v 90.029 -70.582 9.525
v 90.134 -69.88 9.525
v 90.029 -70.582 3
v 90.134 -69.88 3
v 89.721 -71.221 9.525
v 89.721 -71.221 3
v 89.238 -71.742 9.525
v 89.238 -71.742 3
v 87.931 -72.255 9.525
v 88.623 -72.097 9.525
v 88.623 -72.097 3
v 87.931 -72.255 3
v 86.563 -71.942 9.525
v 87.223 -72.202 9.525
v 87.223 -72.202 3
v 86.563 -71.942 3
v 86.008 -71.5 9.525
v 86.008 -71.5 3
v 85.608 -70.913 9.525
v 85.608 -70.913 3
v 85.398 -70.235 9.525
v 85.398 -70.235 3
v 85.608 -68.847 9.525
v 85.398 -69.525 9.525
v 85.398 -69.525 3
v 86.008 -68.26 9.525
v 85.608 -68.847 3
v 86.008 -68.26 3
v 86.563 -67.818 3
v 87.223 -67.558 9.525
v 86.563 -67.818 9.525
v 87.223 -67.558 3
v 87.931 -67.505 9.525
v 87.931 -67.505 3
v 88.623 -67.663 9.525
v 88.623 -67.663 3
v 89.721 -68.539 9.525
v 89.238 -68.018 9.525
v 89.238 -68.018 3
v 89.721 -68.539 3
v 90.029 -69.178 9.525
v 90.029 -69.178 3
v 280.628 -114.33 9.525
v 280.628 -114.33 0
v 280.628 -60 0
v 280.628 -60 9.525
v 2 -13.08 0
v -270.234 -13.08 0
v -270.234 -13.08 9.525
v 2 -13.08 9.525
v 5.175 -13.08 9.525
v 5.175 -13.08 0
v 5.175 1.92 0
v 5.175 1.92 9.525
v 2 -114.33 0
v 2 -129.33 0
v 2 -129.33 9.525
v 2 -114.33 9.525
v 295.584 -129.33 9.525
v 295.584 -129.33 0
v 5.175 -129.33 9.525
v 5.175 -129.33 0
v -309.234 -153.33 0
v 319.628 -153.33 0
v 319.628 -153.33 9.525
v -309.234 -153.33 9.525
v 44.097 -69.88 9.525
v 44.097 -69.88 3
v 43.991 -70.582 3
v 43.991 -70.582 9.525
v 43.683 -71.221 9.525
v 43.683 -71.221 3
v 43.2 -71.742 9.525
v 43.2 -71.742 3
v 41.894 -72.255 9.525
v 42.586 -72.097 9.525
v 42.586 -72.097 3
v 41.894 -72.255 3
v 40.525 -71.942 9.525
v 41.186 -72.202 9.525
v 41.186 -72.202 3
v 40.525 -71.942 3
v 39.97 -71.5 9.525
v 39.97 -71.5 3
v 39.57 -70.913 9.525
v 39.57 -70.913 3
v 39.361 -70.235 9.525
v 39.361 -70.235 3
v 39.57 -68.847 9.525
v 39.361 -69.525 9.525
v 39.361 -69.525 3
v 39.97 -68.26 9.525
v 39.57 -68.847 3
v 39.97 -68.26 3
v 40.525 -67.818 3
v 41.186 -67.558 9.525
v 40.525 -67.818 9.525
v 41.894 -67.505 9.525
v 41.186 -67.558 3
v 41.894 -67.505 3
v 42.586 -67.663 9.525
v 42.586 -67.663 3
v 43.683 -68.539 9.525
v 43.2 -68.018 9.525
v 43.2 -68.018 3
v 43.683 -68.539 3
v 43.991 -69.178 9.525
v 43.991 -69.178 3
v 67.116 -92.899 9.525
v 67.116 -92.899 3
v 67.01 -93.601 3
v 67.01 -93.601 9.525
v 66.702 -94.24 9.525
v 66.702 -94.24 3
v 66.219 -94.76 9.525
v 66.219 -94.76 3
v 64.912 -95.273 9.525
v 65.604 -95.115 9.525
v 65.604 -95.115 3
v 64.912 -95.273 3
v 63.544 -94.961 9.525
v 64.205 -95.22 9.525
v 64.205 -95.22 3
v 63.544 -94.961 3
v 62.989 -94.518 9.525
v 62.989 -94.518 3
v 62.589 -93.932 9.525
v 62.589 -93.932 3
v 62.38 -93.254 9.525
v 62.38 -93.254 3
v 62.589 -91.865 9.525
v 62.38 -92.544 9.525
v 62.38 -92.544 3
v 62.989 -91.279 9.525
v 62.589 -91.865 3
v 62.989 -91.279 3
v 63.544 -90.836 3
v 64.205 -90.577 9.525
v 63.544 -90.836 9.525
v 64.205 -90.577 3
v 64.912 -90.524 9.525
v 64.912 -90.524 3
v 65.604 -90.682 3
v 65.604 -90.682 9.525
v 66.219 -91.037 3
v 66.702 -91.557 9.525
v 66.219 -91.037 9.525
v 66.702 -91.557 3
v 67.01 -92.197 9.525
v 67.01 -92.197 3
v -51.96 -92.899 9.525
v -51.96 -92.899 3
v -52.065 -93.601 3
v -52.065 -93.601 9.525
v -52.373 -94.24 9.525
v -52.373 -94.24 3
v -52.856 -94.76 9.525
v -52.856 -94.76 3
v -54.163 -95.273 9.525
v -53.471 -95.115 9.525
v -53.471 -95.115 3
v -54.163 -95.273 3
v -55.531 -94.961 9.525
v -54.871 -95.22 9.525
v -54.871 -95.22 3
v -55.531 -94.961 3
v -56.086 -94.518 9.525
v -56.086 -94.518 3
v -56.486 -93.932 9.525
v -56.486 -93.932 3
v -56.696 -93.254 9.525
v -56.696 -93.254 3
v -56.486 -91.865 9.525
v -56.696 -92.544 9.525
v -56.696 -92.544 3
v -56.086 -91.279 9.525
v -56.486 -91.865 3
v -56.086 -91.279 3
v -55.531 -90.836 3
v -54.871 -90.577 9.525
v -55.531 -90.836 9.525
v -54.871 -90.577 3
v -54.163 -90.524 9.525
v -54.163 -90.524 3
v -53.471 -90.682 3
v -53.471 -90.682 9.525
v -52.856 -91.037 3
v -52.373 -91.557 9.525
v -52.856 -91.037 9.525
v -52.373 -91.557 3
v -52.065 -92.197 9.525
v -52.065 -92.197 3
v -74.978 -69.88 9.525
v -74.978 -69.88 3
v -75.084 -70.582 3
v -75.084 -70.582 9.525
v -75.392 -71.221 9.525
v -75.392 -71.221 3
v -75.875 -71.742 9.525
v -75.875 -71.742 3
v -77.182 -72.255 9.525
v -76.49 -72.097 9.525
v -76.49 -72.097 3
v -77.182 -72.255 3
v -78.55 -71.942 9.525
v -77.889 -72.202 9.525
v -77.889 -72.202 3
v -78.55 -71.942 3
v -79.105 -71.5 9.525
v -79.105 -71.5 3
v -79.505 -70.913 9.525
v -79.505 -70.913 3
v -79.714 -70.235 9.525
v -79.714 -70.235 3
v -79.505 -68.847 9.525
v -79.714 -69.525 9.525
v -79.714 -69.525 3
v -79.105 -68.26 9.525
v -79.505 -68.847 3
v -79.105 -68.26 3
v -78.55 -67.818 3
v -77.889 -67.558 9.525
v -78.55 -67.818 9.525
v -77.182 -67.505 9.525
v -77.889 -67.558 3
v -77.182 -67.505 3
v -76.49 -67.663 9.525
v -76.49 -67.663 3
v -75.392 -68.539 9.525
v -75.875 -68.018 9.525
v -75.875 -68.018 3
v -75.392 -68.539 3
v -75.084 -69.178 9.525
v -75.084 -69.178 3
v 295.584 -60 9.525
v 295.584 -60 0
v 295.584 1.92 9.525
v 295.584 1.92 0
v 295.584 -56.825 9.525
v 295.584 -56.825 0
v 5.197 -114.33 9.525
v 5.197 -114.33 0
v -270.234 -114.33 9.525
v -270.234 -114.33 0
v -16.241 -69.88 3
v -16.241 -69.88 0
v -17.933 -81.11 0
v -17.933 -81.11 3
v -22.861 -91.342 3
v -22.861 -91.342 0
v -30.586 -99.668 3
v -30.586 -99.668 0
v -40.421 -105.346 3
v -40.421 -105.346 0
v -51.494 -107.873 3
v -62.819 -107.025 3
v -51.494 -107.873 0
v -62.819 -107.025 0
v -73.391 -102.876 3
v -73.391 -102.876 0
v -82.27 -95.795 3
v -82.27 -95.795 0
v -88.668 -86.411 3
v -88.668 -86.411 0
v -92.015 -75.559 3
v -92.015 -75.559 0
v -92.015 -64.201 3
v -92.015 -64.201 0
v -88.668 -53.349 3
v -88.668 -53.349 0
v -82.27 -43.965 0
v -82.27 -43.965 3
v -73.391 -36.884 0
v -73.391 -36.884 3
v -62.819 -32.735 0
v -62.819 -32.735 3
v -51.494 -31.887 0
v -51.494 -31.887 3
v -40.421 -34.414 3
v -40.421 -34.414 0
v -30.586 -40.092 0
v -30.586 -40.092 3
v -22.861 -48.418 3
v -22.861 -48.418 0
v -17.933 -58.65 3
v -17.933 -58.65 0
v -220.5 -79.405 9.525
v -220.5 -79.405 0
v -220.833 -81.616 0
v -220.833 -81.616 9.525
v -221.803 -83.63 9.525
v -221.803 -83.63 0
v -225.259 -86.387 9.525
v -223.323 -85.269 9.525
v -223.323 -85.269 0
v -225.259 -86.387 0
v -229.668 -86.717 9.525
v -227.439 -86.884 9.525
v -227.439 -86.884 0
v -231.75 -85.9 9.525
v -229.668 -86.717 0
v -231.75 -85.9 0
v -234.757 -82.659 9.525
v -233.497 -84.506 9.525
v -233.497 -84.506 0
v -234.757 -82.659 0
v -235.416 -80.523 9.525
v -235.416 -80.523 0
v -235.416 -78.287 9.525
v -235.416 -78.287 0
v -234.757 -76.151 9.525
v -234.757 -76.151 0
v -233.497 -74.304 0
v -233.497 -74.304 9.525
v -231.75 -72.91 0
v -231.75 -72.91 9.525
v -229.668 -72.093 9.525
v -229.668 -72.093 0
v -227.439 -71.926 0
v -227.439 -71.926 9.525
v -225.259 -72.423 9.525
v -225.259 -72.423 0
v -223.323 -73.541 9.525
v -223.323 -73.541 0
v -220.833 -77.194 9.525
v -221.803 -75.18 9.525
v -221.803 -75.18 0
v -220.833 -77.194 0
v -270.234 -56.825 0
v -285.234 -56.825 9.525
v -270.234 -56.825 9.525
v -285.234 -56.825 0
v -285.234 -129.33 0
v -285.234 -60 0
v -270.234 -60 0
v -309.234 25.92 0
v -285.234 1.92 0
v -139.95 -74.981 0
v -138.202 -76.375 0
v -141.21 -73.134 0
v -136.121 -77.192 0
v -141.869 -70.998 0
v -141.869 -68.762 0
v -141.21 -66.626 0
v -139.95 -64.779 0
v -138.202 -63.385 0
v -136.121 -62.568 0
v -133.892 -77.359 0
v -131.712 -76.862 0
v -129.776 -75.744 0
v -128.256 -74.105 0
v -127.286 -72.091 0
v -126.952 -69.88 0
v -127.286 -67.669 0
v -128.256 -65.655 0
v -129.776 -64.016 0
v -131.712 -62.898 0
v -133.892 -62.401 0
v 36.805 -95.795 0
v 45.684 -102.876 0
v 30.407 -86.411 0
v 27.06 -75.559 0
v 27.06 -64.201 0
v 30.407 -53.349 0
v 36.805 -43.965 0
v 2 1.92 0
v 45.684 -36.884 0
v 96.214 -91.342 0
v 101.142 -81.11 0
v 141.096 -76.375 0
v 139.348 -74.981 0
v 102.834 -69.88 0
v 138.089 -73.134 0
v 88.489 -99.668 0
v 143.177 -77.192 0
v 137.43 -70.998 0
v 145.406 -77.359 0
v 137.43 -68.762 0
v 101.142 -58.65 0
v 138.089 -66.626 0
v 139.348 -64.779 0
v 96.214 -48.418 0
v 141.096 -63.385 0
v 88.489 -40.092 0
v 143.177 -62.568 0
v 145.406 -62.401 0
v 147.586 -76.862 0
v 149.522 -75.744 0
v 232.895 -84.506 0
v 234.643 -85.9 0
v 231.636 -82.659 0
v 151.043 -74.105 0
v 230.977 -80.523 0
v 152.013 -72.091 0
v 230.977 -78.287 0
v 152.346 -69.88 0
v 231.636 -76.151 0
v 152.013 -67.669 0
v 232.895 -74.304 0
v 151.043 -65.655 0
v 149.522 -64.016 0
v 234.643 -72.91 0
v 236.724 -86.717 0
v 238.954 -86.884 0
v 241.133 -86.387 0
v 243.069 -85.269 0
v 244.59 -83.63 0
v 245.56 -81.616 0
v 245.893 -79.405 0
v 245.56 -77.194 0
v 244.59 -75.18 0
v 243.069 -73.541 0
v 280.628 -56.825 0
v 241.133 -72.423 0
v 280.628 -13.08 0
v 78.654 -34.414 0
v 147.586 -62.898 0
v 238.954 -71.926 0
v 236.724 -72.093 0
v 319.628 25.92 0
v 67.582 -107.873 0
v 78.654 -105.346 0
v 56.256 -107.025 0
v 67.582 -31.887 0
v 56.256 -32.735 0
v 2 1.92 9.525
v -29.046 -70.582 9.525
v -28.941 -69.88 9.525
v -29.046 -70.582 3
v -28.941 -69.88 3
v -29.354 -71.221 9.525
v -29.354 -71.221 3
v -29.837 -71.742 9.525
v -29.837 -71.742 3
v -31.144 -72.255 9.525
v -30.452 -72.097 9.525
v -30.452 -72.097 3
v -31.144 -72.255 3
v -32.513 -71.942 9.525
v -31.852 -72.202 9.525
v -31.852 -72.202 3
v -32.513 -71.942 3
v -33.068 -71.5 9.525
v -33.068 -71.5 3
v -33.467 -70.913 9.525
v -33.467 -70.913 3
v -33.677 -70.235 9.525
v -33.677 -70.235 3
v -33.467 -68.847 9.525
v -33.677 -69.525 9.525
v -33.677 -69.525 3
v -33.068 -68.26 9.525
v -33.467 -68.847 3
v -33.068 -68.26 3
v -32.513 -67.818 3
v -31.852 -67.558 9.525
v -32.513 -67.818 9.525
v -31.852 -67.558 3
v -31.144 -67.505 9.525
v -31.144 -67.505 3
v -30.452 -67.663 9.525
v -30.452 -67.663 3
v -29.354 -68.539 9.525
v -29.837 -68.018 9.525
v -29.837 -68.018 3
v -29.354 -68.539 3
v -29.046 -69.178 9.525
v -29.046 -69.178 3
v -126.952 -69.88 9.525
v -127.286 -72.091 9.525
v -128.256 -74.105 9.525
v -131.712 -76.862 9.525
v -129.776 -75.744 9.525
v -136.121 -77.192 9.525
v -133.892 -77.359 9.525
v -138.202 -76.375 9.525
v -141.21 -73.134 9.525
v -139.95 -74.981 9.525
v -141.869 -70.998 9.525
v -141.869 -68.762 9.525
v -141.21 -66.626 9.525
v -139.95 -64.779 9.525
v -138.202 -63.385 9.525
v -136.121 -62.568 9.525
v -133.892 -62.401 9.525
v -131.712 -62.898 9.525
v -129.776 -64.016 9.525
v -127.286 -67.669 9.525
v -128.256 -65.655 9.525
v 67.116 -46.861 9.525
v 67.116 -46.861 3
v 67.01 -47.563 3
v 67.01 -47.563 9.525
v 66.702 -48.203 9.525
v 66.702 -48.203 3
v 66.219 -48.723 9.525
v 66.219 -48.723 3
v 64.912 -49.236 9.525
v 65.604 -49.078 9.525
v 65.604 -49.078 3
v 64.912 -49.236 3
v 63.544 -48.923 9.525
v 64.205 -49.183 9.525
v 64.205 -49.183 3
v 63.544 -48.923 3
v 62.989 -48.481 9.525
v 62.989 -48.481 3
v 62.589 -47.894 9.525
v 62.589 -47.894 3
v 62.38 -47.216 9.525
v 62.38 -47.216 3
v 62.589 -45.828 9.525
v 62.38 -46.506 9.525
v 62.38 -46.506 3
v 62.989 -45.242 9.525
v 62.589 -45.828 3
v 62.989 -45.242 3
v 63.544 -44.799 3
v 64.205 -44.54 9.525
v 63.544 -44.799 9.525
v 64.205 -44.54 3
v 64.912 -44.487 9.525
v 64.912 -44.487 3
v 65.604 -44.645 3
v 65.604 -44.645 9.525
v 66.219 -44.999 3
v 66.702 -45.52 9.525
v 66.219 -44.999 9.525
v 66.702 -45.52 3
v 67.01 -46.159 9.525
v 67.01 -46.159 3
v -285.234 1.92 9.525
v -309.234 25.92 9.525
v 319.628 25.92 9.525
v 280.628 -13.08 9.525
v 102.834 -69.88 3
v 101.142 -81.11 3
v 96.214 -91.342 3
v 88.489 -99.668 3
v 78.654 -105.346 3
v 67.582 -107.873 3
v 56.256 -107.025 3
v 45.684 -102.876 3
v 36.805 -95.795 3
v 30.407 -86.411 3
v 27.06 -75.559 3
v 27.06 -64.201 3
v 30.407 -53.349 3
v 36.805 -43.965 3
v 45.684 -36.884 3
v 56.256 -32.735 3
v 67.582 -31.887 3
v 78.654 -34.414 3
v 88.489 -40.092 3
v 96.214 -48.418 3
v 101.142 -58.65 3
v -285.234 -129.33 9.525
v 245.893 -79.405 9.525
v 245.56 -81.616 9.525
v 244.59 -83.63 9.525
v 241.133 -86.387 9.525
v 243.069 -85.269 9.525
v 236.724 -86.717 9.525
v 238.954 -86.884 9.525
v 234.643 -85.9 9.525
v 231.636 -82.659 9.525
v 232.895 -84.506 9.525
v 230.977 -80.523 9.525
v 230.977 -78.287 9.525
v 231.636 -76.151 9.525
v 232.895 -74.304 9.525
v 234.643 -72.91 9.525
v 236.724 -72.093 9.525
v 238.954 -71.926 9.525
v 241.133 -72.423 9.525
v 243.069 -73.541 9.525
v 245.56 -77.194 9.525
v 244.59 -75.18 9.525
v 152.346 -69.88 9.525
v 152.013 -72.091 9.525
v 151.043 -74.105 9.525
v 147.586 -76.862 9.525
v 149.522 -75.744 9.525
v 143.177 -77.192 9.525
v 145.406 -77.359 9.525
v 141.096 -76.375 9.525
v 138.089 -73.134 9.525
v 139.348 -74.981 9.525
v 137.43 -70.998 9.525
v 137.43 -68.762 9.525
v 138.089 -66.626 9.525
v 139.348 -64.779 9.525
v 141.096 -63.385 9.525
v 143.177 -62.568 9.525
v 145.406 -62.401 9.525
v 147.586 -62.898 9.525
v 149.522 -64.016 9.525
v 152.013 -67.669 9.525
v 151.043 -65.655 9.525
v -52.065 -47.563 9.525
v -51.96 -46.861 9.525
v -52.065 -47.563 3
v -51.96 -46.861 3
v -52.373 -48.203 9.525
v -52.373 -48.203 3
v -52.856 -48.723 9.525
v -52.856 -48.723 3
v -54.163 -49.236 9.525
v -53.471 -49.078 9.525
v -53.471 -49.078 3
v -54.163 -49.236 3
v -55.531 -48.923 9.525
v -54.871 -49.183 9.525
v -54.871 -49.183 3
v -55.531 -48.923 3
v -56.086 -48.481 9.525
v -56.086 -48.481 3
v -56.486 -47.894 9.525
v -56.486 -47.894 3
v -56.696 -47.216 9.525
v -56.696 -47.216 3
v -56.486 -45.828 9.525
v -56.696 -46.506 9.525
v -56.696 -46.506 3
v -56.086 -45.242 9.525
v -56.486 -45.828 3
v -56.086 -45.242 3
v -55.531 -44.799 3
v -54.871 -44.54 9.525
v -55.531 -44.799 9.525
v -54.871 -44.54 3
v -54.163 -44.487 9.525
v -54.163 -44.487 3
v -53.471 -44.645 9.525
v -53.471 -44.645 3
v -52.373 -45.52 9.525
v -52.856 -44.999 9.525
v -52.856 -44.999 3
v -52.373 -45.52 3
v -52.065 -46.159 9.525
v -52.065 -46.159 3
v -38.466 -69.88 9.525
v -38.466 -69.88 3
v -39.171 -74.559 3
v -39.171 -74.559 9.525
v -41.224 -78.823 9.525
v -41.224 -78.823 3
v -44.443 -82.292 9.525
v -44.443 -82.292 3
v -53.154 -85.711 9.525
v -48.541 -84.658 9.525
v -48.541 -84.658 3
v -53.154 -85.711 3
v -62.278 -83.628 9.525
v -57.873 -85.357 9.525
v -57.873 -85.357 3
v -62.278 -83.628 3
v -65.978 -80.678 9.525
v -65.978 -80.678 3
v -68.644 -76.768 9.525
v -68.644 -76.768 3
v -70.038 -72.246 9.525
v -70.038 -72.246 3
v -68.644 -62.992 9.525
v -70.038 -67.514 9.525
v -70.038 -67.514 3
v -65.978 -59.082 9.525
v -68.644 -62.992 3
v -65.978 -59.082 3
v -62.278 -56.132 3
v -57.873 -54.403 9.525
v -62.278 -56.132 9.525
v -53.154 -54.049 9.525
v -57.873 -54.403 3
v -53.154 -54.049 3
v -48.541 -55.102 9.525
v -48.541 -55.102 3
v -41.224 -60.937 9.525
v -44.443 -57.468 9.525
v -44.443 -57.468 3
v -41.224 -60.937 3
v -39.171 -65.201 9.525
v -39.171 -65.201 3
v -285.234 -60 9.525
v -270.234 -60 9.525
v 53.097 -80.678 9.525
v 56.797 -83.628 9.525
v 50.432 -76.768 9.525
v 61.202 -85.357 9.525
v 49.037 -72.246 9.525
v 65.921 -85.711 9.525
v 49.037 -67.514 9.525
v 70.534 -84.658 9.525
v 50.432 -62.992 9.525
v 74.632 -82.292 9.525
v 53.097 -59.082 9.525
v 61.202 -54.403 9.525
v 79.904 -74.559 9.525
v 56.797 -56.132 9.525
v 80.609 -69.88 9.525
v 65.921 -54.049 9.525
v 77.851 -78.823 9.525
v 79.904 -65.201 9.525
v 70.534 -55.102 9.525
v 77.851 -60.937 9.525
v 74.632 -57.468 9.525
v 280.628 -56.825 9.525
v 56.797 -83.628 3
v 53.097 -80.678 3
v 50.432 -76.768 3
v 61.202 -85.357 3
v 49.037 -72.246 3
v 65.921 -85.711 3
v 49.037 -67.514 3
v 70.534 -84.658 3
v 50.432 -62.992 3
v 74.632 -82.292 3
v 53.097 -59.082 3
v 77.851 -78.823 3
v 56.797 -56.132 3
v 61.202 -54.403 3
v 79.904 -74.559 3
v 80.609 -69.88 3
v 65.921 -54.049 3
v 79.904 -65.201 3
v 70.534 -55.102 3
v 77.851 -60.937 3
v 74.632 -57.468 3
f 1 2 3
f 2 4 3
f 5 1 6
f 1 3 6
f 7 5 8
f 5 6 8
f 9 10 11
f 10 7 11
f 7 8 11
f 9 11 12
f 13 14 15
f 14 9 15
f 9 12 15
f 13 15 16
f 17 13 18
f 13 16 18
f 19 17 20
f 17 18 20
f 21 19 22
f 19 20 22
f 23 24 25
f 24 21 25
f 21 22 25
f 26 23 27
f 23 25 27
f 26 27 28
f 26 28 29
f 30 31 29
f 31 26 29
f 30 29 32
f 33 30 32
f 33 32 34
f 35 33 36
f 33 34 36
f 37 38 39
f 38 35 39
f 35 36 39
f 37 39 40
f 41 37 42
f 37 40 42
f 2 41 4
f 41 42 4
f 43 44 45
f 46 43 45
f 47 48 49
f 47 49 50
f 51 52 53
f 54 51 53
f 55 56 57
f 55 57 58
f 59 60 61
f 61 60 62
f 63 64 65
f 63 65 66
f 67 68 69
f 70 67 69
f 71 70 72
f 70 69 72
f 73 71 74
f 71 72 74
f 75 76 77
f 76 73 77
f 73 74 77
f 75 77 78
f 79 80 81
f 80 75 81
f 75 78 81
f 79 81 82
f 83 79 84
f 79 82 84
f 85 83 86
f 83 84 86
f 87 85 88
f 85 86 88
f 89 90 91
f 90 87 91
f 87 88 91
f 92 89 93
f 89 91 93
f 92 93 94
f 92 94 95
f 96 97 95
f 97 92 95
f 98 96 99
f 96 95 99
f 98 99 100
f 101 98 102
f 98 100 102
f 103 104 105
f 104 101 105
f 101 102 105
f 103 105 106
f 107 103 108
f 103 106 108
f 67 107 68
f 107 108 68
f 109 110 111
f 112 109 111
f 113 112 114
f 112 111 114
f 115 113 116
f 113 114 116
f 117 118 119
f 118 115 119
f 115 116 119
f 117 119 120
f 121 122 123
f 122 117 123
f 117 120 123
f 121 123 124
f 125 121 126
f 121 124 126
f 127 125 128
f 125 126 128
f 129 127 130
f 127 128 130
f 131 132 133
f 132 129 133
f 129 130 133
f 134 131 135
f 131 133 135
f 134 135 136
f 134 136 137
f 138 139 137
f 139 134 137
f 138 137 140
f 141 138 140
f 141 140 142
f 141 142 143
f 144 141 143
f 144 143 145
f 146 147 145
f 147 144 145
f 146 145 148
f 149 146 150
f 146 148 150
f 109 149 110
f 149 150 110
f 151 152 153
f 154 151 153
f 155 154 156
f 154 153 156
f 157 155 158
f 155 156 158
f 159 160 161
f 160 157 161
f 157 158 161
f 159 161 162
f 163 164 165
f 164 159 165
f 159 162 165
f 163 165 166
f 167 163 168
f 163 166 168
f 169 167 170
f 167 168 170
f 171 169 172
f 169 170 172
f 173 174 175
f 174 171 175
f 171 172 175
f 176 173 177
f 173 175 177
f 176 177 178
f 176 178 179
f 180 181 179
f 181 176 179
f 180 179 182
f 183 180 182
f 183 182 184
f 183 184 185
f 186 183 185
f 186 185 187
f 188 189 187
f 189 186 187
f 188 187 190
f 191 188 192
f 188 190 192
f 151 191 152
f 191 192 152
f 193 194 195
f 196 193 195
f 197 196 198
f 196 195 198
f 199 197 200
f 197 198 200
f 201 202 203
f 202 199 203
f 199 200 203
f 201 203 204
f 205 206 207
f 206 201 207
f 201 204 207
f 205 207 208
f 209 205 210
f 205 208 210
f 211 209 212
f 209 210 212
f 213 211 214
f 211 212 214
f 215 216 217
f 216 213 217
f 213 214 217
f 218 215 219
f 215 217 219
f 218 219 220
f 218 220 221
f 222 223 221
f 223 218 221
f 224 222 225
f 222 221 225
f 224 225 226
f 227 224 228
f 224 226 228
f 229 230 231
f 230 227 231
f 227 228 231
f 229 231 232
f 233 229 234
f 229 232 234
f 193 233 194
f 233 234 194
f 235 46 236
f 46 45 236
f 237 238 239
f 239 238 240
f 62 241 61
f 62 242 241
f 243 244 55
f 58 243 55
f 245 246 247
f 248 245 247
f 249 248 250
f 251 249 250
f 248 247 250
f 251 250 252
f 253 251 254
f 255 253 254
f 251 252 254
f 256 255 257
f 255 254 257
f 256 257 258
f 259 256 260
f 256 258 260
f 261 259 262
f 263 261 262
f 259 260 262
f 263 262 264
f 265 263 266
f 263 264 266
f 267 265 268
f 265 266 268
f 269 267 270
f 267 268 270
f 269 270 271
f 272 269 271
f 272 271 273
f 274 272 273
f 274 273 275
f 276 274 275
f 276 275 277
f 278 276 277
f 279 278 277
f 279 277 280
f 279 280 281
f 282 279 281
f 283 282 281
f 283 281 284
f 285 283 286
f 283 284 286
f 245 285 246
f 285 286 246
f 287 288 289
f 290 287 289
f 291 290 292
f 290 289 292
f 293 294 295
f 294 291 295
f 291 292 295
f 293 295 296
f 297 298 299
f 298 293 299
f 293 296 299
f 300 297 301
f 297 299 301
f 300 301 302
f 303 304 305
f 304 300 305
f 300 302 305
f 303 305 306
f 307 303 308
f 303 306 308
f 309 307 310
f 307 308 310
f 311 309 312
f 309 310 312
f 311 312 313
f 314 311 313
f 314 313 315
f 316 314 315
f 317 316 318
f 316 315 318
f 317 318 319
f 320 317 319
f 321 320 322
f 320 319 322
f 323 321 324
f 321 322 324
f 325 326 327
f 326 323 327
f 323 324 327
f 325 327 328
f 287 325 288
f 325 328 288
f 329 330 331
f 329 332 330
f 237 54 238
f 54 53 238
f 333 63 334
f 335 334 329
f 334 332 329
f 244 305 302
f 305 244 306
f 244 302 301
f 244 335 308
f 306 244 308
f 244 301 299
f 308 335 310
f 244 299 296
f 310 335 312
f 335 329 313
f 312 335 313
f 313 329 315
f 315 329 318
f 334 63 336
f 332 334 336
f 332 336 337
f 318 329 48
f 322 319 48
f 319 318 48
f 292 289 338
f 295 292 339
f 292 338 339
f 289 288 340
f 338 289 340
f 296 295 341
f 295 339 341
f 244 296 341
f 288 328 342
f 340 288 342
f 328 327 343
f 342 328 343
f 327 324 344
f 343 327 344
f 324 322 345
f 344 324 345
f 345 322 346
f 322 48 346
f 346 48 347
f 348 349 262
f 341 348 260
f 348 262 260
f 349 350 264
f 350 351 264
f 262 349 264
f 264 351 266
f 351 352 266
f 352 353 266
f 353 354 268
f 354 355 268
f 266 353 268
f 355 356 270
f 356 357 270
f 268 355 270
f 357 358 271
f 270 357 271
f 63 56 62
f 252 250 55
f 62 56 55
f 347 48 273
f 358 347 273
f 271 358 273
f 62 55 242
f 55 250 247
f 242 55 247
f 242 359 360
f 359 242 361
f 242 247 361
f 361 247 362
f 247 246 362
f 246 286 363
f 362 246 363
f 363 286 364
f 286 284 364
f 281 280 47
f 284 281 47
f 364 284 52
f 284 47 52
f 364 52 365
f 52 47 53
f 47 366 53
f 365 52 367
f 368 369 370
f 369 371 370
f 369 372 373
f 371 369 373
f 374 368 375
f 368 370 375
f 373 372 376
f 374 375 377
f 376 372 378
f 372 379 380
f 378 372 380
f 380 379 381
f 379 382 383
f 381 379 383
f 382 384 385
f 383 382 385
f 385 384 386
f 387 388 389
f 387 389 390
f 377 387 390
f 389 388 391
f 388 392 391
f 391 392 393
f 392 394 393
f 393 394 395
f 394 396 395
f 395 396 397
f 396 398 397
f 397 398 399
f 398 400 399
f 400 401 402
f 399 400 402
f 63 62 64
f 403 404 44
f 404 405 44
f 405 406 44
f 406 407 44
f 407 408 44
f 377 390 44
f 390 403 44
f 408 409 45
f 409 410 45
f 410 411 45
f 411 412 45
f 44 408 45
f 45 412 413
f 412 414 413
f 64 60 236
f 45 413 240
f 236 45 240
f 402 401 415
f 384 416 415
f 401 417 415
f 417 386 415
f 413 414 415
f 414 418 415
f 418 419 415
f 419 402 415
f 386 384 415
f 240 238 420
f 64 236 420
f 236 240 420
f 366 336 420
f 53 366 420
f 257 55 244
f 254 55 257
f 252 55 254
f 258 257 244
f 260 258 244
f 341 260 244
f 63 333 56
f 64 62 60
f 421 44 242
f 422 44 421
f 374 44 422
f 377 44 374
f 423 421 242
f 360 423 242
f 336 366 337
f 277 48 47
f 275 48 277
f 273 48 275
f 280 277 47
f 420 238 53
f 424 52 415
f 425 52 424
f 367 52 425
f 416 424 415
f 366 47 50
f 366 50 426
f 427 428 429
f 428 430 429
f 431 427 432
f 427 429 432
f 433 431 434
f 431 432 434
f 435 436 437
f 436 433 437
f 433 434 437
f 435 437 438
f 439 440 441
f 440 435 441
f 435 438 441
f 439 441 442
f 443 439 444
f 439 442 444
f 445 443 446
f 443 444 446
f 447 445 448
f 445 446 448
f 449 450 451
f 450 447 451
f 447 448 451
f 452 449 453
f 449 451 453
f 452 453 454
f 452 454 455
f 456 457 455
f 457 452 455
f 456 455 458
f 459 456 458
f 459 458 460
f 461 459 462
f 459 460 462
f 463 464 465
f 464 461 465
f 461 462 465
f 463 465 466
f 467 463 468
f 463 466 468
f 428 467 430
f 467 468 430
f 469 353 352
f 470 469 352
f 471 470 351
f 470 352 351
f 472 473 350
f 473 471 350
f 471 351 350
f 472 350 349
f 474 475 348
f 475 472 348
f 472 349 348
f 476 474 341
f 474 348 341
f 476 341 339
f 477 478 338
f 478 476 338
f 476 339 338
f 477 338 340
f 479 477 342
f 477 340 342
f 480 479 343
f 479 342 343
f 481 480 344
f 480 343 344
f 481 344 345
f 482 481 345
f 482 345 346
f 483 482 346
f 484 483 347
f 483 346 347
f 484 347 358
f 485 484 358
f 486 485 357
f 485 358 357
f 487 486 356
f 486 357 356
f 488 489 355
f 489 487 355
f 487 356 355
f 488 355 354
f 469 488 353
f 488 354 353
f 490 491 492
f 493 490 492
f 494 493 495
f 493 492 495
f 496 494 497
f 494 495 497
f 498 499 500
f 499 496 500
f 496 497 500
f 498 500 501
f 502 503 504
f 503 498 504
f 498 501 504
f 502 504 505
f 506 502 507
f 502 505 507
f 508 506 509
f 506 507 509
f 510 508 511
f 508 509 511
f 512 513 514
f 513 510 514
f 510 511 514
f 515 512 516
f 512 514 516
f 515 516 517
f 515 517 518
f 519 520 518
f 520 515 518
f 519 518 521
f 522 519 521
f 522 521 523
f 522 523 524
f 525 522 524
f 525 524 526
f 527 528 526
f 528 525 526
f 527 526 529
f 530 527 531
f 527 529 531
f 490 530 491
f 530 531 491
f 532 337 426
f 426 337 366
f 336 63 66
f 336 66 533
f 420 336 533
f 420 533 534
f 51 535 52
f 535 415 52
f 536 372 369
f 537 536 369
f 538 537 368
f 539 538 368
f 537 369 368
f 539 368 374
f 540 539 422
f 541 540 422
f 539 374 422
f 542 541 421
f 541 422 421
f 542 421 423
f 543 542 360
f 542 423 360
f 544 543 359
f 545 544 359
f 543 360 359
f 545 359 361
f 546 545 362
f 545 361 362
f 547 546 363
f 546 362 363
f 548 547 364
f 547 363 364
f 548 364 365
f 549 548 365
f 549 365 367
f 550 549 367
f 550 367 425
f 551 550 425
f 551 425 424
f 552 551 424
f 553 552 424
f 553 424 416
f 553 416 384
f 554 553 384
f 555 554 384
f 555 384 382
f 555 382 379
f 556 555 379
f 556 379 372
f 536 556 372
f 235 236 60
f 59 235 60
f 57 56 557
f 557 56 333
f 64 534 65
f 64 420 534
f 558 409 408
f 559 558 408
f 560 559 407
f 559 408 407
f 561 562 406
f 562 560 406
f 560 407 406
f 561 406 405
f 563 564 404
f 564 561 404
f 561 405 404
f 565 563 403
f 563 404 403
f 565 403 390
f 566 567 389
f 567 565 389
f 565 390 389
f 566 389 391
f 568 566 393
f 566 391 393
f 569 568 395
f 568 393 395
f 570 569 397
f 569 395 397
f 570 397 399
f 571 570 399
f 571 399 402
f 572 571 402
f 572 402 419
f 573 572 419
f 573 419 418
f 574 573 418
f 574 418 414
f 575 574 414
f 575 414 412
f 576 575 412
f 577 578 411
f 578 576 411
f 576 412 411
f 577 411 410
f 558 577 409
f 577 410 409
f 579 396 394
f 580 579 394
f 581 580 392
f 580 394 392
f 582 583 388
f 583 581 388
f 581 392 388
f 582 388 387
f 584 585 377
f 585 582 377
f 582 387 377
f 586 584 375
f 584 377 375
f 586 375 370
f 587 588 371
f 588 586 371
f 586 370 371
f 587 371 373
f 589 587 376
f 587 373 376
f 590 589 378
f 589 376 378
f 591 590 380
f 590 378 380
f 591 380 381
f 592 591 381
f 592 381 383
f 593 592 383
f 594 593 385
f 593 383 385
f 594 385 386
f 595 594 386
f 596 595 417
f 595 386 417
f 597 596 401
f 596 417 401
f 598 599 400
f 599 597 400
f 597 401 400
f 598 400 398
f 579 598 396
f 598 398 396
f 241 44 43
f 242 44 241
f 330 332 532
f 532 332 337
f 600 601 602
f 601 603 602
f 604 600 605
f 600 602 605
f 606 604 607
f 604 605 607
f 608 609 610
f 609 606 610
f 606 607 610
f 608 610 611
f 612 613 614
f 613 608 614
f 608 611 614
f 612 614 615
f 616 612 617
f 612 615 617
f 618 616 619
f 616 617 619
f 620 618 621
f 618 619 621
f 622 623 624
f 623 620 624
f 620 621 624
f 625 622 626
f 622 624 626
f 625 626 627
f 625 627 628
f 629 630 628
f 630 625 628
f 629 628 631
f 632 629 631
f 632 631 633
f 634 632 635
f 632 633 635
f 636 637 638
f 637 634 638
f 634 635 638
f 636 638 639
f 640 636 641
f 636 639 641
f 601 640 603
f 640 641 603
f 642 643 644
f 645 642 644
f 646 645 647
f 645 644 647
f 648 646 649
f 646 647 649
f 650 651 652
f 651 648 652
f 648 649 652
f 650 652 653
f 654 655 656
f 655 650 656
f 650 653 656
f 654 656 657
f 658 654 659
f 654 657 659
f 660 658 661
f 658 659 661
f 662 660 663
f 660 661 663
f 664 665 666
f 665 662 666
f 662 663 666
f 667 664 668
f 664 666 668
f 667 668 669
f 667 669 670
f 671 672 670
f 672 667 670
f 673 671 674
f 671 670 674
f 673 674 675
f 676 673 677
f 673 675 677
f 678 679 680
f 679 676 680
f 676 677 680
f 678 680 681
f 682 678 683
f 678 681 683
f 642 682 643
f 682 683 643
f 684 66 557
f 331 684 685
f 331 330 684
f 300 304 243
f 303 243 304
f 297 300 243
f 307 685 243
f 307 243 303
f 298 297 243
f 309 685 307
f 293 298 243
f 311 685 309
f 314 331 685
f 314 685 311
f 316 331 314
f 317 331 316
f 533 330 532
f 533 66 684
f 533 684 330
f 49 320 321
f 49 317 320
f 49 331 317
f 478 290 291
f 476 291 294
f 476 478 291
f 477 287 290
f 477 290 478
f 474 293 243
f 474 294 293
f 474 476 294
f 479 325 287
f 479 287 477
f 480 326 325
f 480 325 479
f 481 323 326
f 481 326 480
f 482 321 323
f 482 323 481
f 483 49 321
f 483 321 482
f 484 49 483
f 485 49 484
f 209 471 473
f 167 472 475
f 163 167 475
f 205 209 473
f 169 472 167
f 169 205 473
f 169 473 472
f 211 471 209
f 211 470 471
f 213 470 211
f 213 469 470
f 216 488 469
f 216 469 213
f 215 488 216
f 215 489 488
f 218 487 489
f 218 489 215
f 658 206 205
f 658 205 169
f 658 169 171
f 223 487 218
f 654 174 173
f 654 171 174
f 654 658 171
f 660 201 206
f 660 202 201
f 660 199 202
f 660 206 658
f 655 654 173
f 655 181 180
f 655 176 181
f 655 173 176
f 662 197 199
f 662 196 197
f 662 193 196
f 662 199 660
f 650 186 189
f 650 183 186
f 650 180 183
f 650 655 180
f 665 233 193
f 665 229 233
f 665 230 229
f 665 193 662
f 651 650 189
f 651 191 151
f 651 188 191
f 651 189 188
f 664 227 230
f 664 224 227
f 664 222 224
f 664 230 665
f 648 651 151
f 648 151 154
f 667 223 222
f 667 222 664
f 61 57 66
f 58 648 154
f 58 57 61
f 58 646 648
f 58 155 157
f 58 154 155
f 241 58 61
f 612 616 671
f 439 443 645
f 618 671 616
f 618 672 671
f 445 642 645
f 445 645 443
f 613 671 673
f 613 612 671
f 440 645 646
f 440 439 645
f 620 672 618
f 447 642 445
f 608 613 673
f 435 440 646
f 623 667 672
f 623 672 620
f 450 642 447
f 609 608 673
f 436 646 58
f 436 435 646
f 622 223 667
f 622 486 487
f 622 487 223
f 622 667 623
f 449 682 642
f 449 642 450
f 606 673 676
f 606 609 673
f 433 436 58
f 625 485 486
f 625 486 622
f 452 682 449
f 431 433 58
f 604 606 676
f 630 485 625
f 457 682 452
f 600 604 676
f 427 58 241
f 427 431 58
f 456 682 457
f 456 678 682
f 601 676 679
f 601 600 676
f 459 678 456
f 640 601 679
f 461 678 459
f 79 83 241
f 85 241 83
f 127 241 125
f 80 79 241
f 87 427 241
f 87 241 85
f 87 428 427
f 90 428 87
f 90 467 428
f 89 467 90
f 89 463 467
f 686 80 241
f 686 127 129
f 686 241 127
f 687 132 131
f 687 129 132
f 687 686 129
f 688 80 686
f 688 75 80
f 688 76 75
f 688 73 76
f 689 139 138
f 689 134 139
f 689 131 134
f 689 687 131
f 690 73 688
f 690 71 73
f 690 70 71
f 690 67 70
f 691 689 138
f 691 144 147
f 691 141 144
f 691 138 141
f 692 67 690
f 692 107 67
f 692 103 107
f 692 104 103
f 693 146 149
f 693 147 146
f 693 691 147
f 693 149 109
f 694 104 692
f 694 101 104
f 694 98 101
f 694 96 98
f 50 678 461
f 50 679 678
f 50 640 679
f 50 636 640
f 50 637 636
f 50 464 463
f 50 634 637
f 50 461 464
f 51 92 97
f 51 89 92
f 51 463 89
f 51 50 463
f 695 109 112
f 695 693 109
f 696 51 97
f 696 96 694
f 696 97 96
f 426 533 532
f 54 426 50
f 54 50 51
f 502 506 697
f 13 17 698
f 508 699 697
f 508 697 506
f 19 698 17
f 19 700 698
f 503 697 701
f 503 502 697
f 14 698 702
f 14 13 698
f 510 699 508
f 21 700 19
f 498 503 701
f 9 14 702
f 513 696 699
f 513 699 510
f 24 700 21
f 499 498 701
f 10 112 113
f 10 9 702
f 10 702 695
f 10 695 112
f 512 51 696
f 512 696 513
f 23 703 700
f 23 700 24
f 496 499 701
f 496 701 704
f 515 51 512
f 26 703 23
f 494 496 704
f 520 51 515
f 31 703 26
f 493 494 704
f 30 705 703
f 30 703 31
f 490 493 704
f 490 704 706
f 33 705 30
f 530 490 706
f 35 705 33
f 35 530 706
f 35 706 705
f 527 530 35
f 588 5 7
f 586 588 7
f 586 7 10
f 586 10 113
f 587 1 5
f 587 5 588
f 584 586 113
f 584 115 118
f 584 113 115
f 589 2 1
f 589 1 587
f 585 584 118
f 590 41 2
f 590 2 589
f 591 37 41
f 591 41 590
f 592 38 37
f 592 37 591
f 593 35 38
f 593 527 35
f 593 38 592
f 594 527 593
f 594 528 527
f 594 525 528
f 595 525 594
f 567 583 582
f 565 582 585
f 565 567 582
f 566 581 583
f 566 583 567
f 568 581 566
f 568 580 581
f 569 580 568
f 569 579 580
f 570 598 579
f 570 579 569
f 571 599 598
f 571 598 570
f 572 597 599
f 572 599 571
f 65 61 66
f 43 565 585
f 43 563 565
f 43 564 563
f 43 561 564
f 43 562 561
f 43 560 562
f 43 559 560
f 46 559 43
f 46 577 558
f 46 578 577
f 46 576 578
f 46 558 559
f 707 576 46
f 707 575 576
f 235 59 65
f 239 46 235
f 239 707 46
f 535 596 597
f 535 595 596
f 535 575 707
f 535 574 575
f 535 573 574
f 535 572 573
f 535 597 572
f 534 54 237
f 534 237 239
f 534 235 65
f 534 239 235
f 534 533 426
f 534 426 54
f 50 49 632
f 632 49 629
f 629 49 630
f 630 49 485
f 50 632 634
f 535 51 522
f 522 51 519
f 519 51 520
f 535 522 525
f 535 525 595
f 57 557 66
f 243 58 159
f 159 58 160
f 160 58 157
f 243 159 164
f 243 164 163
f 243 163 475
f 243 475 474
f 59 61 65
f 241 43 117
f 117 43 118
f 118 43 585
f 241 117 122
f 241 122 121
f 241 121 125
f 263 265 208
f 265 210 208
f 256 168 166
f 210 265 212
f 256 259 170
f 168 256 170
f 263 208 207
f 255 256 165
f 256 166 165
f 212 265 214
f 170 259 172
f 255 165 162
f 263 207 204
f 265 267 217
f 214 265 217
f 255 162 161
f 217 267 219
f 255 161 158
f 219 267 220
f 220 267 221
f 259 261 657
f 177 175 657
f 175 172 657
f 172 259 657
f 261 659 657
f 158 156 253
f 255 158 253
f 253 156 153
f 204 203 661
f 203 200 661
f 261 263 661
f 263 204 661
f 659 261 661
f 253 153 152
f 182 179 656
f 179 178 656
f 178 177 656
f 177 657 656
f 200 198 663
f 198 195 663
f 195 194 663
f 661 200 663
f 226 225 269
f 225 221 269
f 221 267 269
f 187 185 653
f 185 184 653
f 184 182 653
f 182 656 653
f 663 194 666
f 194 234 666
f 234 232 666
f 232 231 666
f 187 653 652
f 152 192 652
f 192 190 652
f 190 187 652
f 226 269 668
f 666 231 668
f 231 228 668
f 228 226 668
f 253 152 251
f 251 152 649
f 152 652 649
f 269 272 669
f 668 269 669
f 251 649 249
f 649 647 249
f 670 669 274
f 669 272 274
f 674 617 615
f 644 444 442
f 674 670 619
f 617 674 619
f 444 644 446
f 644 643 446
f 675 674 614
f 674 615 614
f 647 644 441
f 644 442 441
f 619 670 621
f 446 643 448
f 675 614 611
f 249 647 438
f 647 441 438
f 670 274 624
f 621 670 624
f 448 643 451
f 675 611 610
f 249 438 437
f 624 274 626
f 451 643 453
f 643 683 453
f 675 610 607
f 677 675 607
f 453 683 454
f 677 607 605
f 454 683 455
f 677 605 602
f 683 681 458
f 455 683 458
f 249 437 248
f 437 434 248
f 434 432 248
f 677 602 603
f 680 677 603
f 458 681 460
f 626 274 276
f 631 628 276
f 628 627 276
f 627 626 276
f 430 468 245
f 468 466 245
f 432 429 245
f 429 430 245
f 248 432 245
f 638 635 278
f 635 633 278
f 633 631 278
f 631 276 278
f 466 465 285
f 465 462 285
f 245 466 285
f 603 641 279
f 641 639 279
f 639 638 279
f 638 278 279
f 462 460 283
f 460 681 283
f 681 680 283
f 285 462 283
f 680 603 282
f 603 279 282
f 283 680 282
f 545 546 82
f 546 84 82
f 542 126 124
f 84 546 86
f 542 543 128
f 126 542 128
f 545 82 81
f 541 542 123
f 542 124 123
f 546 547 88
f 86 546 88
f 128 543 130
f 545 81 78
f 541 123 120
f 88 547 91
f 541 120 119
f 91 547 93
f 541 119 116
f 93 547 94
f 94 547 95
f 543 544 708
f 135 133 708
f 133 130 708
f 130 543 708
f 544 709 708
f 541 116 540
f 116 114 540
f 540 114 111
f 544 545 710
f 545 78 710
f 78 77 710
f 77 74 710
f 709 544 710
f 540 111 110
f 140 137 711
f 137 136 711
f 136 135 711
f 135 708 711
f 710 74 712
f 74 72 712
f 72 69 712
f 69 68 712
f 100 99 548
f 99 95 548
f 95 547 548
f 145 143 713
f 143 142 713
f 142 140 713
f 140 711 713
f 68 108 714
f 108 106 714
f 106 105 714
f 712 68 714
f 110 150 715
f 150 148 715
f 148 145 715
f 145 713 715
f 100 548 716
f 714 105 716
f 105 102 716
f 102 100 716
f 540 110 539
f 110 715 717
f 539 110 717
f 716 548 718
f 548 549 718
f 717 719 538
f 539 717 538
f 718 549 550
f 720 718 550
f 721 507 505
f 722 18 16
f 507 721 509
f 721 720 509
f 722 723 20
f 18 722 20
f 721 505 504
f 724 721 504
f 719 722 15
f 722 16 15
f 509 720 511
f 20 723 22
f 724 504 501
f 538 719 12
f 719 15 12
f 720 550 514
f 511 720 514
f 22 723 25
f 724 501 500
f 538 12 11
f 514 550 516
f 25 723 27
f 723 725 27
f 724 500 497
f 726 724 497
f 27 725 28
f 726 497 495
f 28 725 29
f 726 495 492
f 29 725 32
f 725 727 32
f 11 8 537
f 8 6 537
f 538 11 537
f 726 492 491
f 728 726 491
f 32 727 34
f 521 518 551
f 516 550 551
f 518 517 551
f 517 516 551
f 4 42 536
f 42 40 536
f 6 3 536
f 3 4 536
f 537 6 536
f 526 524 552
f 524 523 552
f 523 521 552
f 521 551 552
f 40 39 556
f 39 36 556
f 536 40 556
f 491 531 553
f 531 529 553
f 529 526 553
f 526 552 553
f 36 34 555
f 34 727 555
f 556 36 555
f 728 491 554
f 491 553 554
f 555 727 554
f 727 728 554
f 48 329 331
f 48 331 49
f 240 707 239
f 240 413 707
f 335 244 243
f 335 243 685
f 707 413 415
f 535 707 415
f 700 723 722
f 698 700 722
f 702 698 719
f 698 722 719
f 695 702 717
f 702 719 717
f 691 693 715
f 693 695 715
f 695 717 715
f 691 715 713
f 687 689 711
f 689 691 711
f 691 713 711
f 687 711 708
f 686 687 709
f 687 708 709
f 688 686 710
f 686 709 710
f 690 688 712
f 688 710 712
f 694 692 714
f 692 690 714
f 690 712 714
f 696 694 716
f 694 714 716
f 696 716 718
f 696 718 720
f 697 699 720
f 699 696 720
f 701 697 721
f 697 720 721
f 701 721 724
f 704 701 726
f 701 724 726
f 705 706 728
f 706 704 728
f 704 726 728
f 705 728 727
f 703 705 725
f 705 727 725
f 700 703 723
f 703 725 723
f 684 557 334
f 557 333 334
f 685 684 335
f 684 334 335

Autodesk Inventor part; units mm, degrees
ref_plane "YZ Plane" through (0, 0, 0) normal (1, 0, 0) x (0, 1, 0)
ref_plane "XZ Plane" through (0, 0, 0) normal (0, 1, 0) x (-1, 0, 0)
ref_plane "XY Plane" through (0, 0, 0) normal (0, 0, 1) x (1, 0, 0)
sketch "Sketch1" plane through (0, 0, 0) normal (0, 0, 1) x (1, 0, 0)
  line L0 (-270.2344, -114.33) -> (-270.2344, -13.08)
  circle A0 centre (-227.9995, -79.405) radius 7.5
  circle A1 centre (-134.4524, -69.88) radius 7.5
  circle A2 centre (-54.3408, -69.88) radius 15.875
  circle A3 centre (-54.3408, -46.8612) radius 2.3813
  circle A4 centre (-31.322, -69.88) radius 2.3813
  circle A5 centre (-77.3595, -69.88) radius 2.3813
  circle A6 centre (-54.3408, -92.8987) radius 2.3813
  line L1 (-270.2344, -13.08) -> (5.175, -13.08)
  line L2 (-270.2344, -114.33) -> (5.1968, -114.33)
  line L3 (280.6281, -114.33) -> (280.6281, -13.08)
  line L4 (280.6281, -13.08) -> (5.175, -13.08)
  line L5 (280.6281, -114.33) -> (5.1968, -114.33)
  line L6 (-285.2344, 1.92) -> (295.5844, 1.92)
  line L7 (295.5844, 1.92) -> (295.5844, -129.33)
  line L8 (295.5844, -129.33) -> (-285.2344, -129.33)
  line L9 (-285.2344, -129.33) -> (-285.2344, 1.92)
  line L10 (-59, 1.92) -> (-59, 25.92)
  line L11 (-285.2344, -38) -> (-309.2344, -38)
  line L12 (-43, -129.33) -> (-43, -153.33)
  line L13 (295.5844, -72.2612) -> (319.5844, -72.2612)
  line L14 (-309.2344, 25.92) -> (319.6281, 25.92)
  line L15 (319.6281, 25.92) -> (319.6281, -153.33)
  line L16 (319.6281, -153.33) -> (-309.2344, -153.33)
  line L17 (-309.2344, -153.33) -> (-309.2344, 25.92)
  line L18 (2, -13.08) -> (2, 1.92)
  line L19 (5.175, -13.08) -> (5.175, 1.92)
  line L20 (2, -129.33) -> (2, -114.33)
  line L21 (-285.2344, -56.825) -> (-270.2344, -56.825)
  line L22 (-285.2344, -60) -> (-270.2344, -60)
  line L23 (280.6281, -56.825) -> (295.5844, -56.825)
  line L24 (5.1968, -114.33) -> (5.175, -129.33)
  line L25 (280.6281, -60) -> (295.5844, -60)
  circle A7 centre (238.3931, -79.405) radius 7.5
  circle A8 centre (144.846, -69.88) radius 7.5
  circle A9 centre (64.7344, -69.88) radius 15.875
  circle A10 centre (64.7344, -46.8612) radius 2.3813
  circle A11 centre (41.7157, -69.88) radius 2.3813
  circle A12 centre (87.7532, -69.88) radius 2.3813
  circle A13 centre (64.7344, -92.8987) radius 2.3813
  circle A14 centre (64.7344, -69.88) radius 38.1
  circle A15 centre (-54.3408, -69.88) radius 38.1
  point P0 (0, 0)
  dimension "d4" = 15
  dimension "d7" = 15
  dimension "d9" = 31.75
  dimension "d11" = 4.7625
  dimension "d13" = 4.7625
  dimension "d15" = 23.0188
  dimension "d16" = 4.7625
  dimension "d18" = 4.7625
  dimension "d25" = 550.8625
  dimension "d30" = 24
  dimension "d31" = 24
  dimension "d32" = 24
  dimension "d33" = 24
  dimension "d34" = 3.175
  dimension "d36" = 3.175
  dimension "d50" = 23.0188
  dimension "d51" = 23.0188
  dimension "d52" = 23.0188
  dimension "d53" = 80.1116
  dimension "d54" = 93.5471
  dimension "d56" = 119.0752
  dimension "d57" = 80.1116
  dimension "d60" = 93.5471
  dimension "d61" = 76.2
  dimension "d62" = 76.2
extrude "Extrusion2" add sketch "Sketch1" along normal blind 9.525 contours L0 L1 L4 L3 L5 L2 | L22 L9 L21 L0 | L2 L24 L8 L20 | L9 L8 L12 L16 L17 L11 | L8 L7 L6 L10 L14 L15 L16 L12 | L18 L6 L19 L1 | L11 L17 L14 L10 L6 L9 | L3 L23 L7 L25 | A14 | A15
emboss "Emboss2" sketch "Sketch1" operation cut depth 3 direction (0, 0, 1) contours A14 | A15
properties part number "side-UPDATED"
